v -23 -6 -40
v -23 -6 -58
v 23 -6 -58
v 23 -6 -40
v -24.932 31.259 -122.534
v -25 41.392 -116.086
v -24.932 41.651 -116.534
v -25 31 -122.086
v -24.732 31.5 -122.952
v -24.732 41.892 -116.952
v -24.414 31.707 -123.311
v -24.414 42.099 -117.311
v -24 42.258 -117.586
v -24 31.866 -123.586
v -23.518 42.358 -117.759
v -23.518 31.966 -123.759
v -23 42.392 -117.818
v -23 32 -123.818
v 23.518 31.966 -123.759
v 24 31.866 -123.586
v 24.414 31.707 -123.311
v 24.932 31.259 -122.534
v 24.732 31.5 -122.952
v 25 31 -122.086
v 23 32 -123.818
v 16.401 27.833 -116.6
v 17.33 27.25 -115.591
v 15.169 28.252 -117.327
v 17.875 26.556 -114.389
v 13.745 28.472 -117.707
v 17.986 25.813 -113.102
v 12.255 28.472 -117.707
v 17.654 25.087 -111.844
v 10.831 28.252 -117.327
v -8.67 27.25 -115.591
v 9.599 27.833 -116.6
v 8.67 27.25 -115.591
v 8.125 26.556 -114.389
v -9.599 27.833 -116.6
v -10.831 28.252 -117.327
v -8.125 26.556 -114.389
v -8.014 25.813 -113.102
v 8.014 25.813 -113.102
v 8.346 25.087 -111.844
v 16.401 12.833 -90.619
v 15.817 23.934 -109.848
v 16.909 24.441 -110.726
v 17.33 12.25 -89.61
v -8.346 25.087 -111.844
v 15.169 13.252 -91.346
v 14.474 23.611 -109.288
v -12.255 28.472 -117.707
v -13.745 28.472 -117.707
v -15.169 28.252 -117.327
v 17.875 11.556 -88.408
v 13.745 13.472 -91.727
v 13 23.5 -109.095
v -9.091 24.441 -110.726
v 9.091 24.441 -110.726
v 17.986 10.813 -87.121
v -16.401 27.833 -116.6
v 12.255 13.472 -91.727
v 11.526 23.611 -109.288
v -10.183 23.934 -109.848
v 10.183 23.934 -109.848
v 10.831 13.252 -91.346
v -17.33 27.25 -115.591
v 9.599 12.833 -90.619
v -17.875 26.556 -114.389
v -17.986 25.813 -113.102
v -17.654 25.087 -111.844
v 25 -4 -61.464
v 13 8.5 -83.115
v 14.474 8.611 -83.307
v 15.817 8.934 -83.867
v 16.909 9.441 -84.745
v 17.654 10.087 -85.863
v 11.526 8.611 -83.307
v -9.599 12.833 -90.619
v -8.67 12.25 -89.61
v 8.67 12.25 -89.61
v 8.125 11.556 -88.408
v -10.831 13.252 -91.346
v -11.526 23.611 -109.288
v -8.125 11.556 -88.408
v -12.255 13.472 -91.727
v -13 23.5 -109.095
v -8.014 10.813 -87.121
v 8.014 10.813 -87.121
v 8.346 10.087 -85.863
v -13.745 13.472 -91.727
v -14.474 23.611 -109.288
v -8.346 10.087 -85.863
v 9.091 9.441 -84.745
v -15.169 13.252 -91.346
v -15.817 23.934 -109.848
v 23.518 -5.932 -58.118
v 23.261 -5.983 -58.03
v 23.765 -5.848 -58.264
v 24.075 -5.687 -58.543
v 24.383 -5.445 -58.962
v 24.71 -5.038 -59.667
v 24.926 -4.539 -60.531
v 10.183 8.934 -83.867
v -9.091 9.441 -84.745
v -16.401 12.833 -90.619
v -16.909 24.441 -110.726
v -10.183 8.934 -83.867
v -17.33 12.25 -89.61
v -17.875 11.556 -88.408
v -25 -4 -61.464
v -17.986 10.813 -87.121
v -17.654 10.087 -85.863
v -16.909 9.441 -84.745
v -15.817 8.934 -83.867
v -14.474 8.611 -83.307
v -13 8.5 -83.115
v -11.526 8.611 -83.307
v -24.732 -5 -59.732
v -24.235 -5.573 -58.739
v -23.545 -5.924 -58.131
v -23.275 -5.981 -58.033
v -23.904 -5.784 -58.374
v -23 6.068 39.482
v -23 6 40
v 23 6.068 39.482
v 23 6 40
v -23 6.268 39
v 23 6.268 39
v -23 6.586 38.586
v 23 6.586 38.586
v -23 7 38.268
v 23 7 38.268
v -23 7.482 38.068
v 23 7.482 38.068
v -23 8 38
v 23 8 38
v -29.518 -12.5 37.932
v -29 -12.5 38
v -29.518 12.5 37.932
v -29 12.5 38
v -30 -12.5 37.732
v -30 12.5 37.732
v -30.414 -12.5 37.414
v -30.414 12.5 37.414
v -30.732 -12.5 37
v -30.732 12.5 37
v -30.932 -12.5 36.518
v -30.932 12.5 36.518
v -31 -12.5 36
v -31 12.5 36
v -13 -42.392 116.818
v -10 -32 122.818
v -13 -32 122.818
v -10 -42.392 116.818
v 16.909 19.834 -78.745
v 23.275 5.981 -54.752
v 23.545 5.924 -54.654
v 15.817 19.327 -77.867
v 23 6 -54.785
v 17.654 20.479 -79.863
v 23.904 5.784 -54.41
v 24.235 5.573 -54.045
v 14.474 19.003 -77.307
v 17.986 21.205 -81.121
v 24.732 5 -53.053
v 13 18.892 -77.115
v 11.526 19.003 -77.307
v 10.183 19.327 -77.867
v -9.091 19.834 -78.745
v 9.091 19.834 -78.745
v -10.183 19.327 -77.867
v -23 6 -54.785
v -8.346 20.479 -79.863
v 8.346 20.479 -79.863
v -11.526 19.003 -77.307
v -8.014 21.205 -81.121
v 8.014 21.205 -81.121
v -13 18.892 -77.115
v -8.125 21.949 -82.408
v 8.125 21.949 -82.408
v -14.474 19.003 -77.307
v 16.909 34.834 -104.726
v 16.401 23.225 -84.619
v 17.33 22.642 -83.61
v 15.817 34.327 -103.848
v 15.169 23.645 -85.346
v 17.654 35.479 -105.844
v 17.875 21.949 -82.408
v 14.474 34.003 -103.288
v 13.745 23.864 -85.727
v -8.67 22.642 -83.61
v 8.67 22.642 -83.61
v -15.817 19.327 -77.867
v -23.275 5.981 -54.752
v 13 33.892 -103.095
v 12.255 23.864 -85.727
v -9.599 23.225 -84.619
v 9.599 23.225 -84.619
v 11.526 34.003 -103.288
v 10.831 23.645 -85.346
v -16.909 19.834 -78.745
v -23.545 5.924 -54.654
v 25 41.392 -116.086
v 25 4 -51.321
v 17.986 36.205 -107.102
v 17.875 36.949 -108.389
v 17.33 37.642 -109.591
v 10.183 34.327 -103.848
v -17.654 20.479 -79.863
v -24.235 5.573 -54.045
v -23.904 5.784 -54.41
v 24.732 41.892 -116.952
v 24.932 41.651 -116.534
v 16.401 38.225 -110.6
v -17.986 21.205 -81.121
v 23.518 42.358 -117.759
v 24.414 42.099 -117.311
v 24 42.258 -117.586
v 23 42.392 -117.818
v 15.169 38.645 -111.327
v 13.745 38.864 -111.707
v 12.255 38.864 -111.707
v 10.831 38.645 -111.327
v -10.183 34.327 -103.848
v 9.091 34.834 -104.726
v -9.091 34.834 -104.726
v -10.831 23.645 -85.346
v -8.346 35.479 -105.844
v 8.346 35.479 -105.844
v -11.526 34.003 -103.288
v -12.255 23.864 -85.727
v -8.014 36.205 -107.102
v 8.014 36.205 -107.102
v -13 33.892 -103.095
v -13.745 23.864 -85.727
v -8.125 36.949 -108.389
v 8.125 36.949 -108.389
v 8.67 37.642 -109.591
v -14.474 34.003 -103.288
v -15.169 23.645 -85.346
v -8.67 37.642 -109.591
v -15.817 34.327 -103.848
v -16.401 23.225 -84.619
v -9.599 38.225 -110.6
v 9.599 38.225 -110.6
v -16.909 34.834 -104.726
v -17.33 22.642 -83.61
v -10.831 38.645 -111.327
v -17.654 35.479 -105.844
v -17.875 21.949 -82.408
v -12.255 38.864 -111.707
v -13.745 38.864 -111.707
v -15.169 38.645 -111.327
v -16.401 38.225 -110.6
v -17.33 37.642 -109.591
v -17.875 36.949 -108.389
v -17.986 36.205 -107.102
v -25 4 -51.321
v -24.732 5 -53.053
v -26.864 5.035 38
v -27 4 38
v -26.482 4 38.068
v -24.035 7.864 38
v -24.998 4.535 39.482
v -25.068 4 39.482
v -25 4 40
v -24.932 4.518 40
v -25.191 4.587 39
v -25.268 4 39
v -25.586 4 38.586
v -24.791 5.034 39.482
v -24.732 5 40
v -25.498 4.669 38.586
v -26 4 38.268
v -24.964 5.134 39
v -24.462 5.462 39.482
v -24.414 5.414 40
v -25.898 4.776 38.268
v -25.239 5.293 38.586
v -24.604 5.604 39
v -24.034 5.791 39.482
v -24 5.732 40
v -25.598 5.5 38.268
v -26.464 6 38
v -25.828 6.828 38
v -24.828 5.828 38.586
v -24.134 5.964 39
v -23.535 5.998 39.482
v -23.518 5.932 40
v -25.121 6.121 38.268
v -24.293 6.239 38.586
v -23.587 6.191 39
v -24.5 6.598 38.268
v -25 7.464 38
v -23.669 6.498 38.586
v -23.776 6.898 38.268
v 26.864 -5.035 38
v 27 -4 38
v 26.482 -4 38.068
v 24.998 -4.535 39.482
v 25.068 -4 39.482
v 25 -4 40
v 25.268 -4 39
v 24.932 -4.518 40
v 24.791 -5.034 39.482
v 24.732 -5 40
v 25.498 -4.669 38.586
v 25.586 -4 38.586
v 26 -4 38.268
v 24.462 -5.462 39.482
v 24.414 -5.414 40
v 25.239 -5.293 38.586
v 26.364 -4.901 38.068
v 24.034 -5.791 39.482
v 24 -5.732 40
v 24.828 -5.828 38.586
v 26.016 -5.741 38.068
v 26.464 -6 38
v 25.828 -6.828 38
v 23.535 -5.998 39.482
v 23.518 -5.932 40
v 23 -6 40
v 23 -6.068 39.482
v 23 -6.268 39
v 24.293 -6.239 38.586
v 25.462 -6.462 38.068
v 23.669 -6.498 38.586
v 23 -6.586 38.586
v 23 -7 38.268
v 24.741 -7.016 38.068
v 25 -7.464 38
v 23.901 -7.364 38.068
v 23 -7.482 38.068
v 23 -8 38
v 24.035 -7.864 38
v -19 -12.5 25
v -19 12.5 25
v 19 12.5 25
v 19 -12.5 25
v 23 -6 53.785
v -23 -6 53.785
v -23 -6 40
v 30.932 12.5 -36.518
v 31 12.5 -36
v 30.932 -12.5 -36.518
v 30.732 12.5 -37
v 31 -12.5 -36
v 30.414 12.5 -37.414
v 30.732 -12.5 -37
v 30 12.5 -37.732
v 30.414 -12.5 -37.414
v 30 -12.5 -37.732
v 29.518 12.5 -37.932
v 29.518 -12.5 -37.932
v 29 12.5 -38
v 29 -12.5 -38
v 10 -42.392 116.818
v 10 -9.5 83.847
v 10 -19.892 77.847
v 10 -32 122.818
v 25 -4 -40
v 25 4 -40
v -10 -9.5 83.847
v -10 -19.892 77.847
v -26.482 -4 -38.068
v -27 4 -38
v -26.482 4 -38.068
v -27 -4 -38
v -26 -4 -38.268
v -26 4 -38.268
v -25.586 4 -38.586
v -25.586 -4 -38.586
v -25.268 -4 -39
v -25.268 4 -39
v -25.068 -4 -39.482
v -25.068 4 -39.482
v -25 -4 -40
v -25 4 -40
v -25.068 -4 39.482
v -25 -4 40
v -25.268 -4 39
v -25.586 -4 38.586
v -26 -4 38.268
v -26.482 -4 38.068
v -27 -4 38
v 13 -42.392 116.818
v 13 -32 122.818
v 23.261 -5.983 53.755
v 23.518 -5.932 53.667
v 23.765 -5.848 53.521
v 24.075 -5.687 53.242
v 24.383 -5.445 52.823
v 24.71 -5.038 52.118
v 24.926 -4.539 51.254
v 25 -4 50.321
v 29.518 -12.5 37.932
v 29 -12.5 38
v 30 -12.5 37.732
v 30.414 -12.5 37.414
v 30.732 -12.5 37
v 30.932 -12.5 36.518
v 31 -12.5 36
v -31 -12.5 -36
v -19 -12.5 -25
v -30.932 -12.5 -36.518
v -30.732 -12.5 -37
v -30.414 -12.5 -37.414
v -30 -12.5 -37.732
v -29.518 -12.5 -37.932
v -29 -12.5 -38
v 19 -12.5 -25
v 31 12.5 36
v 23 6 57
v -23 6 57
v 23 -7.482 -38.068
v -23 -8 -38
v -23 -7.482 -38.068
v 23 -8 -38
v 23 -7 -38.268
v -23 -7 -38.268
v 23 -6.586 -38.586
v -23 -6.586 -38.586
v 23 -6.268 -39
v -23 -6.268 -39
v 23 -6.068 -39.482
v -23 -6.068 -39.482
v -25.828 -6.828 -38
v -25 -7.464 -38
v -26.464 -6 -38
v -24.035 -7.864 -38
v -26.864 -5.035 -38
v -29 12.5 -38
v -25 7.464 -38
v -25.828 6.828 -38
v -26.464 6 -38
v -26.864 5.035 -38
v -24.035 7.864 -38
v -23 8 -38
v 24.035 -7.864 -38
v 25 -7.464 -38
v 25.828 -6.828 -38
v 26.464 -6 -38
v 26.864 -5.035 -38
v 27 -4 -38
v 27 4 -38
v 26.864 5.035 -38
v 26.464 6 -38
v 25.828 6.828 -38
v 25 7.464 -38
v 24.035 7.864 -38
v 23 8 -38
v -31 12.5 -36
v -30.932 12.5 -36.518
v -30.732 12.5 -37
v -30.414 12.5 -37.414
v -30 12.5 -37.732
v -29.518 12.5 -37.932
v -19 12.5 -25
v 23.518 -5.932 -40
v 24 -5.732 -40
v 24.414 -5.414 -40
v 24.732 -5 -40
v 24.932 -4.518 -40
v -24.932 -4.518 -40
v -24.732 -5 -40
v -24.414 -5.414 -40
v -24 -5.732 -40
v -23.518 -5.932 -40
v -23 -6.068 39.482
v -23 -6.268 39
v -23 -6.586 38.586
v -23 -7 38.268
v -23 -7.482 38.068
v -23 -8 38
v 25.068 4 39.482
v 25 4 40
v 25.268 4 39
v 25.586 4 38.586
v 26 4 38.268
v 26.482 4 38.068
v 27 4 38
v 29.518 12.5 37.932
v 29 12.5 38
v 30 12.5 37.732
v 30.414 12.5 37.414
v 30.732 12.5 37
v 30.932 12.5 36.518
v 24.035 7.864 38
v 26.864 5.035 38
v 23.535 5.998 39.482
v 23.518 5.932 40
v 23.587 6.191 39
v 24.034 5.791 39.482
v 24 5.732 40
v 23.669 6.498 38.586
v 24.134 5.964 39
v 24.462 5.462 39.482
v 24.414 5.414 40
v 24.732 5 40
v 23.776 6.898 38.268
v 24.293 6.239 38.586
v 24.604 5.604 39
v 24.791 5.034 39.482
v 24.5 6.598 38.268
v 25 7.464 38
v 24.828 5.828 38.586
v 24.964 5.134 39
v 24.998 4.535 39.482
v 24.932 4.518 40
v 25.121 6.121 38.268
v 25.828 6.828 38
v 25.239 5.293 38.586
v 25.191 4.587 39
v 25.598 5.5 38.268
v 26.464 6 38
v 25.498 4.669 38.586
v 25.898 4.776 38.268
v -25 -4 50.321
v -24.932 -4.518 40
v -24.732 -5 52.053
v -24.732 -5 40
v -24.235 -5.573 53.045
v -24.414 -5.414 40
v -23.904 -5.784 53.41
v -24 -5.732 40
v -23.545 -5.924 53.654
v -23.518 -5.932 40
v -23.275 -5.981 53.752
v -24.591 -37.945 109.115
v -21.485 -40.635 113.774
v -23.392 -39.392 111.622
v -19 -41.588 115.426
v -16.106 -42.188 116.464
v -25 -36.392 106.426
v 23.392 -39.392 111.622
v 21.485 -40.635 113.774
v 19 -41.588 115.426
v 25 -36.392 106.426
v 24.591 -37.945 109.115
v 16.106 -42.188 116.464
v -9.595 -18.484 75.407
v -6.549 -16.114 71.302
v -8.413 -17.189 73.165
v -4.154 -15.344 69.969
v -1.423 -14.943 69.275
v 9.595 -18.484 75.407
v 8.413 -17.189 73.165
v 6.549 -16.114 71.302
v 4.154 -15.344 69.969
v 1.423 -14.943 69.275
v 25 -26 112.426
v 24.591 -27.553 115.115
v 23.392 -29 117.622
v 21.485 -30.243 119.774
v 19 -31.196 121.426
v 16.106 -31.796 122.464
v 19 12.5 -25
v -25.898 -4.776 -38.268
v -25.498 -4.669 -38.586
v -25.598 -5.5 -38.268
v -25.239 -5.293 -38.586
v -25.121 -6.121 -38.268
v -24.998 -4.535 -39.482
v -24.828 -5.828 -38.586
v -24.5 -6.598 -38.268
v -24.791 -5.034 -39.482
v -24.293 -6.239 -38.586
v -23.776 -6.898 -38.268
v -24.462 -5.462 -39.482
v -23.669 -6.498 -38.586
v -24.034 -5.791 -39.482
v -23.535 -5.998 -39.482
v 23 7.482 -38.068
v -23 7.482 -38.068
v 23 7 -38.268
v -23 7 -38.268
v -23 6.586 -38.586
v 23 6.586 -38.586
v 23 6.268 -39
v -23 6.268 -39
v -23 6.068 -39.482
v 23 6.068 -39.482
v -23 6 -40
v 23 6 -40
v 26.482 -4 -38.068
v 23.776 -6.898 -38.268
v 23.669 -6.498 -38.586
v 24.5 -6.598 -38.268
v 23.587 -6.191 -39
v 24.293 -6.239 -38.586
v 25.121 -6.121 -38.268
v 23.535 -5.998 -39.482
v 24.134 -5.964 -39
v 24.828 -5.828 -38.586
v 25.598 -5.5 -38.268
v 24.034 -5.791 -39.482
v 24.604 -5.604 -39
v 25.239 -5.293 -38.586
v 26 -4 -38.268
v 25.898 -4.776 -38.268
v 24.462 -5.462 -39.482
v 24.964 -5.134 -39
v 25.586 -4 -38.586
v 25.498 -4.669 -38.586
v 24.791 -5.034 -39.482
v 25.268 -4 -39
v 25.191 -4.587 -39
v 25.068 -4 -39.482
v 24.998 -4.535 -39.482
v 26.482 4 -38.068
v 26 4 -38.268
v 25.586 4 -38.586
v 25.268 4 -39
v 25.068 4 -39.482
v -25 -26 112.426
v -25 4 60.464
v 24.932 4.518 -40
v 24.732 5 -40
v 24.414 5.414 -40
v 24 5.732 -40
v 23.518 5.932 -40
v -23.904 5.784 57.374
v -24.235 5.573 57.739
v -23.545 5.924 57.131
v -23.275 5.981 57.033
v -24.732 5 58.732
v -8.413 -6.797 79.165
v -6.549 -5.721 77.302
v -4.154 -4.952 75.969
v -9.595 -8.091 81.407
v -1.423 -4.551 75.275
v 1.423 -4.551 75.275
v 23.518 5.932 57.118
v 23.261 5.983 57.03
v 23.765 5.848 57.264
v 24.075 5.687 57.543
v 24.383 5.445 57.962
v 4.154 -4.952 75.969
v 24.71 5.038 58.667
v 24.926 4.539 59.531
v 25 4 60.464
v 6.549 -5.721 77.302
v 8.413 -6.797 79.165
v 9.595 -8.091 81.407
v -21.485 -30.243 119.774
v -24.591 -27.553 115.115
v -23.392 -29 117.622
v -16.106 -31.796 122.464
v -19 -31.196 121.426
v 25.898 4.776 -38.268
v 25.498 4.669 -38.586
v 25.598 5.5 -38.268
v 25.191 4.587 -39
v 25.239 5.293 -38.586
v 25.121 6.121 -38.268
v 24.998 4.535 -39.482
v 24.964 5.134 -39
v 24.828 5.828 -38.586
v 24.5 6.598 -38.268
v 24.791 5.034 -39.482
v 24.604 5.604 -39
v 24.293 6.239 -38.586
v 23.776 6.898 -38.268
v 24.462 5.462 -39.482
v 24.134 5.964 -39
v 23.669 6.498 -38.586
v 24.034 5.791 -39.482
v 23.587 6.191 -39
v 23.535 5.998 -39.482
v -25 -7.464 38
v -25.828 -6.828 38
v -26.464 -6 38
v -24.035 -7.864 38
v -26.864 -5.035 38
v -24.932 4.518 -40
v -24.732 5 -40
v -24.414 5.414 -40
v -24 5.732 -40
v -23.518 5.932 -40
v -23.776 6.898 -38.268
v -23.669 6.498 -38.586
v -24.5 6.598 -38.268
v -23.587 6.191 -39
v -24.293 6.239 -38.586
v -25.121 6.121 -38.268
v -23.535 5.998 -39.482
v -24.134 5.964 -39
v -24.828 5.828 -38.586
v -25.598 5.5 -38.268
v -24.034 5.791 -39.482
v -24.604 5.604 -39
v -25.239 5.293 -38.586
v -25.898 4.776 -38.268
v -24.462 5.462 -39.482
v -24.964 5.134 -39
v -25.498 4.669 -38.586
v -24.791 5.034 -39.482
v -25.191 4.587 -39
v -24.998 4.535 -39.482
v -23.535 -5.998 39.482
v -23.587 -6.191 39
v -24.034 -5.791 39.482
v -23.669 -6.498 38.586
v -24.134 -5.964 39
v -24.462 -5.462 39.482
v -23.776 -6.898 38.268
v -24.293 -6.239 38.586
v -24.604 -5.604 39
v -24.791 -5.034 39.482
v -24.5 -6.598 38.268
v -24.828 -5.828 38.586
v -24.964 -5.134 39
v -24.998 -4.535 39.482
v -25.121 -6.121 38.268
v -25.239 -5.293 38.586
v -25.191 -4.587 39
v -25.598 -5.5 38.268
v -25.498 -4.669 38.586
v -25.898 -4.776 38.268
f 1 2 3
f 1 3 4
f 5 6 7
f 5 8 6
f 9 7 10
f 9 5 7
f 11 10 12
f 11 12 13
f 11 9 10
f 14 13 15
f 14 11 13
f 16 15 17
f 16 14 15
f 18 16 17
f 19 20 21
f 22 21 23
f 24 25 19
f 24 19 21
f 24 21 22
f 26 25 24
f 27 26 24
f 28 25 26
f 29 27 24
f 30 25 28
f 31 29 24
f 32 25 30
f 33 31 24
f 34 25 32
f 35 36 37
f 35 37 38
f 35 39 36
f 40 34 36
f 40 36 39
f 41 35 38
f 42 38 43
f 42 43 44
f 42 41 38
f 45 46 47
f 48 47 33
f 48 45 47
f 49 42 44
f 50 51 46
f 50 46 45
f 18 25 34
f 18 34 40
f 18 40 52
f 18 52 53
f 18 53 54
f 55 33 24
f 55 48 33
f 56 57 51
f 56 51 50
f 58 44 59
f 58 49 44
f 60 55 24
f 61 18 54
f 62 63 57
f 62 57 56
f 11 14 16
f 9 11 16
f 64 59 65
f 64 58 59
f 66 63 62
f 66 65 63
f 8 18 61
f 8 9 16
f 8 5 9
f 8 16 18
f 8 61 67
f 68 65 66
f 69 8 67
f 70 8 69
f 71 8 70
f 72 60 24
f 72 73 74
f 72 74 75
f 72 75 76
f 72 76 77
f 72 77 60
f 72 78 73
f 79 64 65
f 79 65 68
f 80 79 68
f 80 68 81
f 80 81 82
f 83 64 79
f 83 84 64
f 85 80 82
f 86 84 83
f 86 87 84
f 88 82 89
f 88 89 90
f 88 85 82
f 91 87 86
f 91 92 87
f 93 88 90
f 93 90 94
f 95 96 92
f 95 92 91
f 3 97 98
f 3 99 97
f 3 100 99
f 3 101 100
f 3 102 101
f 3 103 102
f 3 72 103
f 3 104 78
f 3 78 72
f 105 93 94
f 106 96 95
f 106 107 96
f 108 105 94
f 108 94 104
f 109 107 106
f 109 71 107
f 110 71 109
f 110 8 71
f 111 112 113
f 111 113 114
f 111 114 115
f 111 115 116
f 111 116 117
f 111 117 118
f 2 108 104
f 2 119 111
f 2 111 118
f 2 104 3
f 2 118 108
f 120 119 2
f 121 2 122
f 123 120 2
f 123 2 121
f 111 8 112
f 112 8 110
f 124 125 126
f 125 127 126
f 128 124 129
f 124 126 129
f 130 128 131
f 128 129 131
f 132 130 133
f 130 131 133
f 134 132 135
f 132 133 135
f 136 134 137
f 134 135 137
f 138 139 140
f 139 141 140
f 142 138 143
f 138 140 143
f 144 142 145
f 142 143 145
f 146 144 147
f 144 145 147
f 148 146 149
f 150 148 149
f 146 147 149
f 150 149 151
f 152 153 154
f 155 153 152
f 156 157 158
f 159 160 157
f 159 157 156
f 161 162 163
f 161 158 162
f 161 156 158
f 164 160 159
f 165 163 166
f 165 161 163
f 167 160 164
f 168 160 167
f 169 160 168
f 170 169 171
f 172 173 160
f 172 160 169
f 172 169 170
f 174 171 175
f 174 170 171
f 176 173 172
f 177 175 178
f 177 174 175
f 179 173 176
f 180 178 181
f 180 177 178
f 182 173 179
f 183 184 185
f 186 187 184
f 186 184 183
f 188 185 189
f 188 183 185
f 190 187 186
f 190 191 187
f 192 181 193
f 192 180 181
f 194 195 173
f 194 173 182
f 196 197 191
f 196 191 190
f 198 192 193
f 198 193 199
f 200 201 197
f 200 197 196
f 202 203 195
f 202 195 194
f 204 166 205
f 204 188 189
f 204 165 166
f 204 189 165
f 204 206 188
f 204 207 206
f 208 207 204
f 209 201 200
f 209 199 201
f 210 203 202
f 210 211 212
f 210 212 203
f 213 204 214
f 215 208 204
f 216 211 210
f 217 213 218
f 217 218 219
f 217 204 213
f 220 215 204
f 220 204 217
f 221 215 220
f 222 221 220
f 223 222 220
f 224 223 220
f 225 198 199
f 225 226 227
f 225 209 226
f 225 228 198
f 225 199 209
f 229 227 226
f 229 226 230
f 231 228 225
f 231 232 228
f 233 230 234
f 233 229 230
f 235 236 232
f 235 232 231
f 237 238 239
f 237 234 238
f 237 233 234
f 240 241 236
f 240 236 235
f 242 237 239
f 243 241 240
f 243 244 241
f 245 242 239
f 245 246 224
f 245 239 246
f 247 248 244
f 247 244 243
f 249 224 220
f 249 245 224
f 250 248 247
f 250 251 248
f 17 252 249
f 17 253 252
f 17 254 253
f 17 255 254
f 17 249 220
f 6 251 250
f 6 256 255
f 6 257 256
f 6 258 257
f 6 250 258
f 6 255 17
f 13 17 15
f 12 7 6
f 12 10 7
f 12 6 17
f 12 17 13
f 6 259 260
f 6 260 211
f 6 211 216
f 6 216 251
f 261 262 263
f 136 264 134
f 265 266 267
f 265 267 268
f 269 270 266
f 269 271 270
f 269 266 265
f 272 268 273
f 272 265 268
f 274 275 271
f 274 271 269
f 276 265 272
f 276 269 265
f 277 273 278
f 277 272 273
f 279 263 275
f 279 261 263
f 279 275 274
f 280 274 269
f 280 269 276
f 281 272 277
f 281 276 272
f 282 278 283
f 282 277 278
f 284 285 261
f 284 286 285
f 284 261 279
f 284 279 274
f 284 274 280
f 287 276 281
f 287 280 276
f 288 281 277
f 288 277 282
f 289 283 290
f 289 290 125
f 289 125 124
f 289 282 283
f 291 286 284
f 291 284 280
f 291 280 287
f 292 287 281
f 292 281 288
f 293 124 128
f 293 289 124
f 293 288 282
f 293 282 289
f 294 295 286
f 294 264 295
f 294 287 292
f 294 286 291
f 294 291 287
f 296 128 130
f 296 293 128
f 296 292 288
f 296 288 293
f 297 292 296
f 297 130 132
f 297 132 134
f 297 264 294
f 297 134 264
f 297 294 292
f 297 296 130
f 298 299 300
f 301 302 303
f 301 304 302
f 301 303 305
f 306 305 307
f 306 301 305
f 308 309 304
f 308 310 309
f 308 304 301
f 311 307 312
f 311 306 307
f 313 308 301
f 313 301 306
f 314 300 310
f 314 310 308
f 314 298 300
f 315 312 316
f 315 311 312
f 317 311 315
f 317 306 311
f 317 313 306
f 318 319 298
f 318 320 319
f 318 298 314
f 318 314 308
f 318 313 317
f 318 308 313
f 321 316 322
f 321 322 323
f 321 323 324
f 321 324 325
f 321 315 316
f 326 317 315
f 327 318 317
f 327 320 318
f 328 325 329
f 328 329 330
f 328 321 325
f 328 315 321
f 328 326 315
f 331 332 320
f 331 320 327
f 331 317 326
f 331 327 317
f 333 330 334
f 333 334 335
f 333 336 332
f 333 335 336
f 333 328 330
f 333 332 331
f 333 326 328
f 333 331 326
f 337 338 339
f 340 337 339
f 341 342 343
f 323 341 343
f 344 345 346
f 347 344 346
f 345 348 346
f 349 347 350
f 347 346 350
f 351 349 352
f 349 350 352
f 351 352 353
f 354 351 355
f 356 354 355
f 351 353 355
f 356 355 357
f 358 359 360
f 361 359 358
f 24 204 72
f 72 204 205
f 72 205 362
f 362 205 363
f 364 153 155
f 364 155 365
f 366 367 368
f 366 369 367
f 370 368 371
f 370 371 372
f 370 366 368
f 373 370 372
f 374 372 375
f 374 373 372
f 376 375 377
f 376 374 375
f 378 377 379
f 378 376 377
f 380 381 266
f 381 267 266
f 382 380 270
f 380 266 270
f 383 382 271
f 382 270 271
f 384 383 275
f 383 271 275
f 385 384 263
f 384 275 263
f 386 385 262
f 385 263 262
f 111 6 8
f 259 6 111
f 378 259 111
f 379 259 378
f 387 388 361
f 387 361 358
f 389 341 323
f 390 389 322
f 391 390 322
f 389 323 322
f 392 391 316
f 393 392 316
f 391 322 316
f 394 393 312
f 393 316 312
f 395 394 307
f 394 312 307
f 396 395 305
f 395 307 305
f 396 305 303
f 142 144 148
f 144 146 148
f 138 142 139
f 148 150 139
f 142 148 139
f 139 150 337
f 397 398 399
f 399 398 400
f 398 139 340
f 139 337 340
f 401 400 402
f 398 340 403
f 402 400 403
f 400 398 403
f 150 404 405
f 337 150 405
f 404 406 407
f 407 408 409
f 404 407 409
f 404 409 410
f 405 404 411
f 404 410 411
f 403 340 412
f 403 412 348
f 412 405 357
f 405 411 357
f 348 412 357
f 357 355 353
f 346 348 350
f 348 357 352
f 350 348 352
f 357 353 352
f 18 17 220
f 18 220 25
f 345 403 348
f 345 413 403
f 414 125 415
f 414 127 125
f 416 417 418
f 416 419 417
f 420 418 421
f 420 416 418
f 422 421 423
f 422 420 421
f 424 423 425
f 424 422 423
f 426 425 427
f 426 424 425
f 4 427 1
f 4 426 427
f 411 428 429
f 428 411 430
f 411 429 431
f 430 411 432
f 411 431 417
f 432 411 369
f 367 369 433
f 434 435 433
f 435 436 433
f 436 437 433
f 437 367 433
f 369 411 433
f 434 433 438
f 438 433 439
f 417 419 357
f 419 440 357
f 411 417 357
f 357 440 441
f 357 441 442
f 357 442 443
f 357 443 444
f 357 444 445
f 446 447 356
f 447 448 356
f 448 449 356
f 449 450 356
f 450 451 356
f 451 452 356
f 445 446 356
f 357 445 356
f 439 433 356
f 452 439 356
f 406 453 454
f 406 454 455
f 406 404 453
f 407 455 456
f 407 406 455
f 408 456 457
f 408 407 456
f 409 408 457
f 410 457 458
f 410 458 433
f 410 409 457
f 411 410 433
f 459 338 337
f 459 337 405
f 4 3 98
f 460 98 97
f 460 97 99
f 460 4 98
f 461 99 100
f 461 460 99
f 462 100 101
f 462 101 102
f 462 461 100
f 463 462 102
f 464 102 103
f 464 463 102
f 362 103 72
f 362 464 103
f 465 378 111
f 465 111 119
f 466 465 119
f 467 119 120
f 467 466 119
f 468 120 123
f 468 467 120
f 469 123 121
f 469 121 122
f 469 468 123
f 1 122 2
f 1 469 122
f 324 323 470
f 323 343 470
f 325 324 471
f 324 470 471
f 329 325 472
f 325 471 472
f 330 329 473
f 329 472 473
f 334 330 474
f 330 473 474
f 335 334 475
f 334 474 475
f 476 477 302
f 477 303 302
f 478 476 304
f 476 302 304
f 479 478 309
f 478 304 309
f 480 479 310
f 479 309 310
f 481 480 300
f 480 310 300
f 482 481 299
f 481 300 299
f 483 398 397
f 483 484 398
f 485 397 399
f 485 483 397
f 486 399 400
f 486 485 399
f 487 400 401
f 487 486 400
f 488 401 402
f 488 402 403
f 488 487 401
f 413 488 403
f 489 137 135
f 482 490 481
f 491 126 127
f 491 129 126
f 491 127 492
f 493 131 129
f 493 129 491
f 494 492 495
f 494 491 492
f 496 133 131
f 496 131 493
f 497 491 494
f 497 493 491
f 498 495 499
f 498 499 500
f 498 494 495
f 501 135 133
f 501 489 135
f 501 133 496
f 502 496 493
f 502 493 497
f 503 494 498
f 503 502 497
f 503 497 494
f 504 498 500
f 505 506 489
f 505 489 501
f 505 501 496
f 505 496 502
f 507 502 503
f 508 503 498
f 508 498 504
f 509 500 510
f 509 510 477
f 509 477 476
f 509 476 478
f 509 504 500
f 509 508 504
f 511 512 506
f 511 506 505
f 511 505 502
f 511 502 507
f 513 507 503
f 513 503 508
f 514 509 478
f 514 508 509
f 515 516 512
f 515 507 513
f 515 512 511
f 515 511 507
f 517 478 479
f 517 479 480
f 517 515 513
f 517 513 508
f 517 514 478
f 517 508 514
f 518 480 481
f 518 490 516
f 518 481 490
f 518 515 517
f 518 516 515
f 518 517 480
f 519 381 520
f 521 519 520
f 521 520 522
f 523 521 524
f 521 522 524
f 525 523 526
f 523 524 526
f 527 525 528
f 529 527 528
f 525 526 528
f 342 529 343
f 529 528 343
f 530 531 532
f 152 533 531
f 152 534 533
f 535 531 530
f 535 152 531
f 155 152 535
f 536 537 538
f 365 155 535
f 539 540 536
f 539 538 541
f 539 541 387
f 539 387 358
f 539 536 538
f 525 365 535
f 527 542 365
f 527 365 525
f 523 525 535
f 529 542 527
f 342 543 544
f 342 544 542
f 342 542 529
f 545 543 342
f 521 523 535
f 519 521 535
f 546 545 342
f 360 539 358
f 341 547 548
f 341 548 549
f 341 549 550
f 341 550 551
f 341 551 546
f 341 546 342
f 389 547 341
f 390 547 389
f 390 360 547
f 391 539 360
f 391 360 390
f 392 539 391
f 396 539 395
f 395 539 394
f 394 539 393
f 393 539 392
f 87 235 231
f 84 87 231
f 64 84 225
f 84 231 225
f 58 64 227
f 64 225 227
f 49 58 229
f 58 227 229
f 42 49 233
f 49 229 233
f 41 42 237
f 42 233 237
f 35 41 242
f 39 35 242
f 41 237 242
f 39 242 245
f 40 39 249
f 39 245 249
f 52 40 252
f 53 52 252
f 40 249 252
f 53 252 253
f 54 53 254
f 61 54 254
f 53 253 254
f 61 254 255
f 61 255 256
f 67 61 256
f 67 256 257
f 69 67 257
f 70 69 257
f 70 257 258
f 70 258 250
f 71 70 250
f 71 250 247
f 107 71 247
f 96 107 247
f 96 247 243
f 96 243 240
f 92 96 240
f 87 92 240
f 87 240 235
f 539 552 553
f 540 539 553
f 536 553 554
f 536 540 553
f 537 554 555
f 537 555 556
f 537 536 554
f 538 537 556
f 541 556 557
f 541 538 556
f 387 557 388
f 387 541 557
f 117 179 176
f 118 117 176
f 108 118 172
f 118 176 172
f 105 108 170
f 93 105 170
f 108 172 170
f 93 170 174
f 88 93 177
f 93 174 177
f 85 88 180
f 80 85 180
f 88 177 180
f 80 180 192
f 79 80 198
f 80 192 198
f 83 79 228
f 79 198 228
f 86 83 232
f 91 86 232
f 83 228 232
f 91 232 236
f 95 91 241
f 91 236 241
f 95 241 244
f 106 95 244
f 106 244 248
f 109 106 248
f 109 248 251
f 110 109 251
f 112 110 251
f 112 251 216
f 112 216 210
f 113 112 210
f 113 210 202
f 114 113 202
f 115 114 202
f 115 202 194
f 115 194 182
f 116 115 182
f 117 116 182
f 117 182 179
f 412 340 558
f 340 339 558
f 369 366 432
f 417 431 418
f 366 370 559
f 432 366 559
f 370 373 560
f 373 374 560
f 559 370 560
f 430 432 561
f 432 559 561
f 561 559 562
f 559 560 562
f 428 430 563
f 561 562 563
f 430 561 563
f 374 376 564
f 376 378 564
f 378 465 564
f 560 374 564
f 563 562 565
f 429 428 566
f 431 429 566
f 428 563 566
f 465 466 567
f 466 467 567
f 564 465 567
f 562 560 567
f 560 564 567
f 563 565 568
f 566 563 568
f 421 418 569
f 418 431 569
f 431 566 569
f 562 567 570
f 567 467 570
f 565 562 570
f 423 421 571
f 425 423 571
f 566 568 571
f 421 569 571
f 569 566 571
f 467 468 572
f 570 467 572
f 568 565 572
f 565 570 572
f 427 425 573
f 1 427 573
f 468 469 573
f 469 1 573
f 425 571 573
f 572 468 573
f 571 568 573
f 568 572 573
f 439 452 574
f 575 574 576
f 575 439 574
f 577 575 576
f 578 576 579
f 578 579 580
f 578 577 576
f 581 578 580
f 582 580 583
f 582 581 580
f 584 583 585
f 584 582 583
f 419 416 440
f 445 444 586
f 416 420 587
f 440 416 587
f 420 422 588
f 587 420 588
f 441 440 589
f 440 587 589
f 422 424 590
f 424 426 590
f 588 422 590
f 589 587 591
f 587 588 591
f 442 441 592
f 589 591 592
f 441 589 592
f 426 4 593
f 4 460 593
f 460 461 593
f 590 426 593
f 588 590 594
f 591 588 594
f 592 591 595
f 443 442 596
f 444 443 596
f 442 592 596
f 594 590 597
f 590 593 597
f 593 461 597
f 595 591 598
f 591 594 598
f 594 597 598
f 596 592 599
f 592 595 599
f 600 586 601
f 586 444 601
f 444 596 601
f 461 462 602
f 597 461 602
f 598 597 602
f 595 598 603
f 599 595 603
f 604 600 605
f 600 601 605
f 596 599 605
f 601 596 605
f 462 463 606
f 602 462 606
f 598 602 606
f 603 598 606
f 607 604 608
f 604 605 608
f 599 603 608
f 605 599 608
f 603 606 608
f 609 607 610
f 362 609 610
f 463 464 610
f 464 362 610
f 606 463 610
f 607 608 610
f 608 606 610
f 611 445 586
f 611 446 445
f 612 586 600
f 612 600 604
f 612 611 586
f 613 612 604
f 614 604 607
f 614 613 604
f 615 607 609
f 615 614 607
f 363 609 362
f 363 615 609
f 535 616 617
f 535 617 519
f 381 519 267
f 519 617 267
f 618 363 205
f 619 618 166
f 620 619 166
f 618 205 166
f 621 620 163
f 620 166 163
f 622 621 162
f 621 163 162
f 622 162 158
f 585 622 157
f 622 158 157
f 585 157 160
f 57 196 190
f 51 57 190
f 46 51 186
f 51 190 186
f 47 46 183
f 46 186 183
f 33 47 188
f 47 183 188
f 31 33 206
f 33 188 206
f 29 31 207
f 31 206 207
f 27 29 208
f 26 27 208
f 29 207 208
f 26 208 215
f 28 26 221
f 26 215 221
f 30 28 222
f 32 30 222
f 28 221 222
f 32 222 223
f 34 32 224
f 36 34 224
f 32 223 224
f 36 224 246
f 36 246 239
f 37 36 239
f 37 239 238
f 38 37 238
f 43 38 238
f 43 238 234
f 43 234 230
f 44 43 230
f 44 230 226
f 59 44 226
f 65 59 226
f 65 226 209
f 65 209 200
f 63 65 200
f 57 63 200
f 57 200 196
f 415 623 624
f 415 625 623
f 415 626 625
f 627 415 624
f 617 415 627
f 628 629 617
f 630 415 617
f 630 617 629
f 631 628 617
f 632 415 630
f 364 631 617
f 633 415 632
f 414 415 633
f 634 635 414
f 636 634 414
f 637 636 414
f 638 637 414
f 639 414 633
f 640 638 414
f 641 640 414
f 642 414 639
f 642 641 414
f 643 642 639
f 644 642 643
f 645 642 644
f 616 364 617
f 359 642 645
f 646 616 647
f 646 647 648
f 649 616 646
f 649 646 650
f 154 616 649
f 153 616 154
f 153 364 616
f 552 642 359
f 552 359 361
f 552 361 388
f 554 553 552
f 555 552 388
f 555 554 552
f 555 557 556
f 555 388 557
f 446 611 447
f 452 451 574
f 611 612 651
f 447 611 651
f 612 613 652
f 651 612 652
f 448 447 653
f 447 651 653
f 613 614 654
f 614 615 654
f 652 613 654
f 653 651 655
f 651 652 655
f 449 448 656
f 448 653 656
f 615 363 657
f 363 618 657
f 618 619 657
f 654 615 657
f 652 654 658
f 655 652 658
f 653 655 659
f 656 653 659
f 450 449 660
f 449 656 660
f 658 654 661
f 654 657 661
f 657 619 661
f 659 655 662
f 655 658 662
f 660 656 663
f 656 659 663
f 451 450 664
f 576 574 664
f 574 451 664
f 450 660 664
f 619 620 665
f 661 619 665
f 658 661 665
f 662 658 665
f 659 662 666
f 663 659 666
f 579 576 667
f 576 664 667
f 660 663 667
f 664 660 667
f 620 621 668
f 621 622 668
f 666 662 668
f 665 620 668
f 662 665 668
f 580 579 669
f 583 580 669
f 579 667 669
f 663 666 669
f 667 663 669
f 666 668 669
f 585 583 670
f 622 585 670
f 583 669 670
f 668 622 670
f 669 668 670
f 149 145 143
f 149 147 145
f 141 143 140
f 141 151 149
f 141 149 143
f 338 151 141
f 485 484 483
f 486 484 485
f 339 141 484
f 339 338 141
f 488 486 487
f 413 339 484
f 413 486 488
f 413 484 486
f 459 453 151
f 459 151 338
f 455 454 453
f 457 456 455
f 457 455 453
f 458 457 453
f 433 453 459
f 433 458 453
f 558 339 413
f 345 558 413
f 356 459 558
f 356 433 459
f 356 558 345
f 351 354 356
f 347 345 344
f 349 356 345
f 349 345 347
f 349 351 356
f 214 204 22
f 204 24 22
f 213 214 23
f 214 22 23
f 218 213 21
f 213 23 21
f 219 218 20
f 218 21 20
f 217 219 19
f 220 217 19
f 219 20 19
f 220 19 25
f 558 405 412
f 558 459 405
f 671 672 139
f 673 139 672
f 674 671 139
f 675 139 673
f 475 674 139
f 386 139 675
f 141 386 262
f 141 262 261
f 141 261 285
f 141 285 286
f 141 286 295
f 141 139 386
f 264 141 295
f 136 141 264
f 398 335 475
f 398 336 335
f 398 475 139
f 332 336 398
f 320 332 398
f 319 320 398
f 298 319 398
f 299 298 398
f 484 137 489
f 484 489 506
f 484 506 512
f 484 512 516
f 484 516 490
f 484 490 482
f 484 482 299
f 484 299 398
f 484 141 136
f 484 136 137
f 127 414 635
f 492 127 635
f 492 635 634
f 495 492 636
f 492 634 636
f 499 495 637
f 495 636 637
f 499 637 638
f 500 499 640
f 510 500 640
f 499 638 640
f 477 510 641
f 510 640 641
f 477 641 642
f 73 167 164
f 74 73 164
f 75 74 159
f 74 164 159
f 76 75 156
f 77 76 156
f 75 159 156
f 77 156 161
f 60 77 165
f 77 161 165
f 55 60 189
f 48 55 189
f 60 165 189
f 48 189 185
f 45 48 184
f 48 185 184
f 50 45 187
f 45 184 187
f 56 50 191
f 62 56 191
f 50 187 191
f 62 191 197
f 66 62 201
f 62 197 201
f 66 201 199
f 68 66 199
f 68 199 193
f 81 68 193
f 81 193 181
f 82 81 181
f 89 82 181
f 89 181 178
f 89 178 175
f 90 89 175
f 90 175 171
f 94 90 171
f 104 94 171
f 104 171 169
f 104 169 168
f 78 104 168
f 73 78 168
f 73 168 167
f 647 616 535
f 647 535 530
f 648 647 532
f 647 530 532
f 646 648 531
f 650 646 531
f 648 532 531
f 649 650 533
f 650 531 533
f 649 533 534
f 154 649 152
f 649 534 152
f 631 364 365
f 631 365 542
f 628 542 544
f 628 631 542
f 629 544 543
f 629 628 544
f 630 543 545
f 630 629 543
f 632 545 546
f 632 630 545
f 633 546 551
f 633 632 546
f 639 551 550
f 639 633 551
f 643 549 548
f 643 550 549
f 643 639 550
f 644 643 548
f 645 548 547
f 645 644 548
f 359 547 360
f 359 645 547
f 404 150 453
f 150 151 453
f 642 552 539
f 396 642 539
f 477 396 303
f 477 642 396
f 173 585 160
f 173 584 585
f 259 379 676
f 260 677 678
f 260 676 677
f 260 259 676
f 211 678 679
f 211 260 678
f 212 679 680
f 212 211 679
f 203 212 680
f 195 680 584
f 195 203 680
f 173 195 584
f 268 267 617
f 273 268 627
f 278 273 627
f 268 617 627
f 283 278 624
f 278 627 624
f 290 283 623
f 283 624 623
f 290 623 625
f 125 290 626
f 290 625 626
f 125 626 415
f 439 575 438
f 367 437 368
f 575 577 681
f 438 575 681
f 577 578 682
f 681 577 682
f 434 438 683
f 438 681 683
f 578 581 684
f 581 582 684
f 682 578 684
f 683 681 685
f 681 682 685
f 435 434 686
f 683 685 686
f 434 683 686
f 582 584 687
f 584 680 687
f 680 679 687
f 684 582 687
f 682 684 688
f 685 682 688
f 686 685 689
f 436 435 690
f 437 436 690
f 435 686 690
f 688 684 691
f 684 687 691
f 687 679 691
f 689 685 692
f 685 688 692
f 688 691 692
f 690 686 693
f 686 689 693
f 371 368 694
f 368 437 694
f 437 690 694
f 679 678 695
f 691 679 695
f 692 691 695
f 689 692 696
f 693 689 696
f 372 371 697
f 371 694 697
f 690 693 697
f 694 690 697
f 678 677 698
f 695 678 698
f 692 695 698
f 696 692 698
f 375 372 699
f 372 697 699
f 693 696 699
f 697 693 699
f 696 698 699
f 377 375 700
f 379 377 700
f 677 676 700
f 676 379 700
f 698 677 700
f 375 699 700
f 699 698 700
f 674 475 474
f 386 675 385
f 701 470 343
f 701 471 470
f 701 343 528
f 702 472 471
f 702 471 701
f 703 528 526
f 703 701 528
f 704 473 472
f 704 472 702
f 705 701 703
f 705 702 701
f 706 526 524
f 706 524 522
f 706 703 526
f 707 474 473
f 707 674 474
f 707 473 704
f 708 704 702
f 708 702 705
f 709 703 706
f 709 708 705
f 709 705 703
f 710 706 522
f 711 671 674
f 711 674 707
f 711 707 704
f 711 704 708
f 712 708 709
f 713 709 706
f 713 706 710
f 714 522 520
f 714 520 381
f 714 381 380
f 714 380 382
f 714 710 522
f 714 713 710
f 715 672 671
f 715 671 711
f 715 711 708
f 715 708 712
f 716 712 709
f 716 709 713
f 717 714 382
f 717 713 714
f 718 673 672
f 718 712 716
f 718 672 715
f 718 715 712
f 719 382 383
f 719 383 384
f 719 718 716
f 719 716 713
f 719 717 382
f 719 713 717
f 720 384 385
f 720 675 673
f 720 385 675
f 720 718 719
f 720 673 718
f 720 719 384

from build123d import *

# Parameters (mm, degrees)
SKETCH_1_W          = 62
SKETCH_1_H          = 76
SKETCH_1_W_2        = 38
SKETCH_1_H_2        = 50
EXTRUDE_1_DEPTH     = 12.5
EXTRUDE_2_DEPTH     = 25
SKETCH_3_R          = 5
CUT_EXTRUDE_3_DEPTH = 151.634898624
CUT_EXTRUDE_4_DEPTH = 161.843921561
FILLET_1_R          = 12
FILLET_2_R          = 2
FILLET_3_R          = 2


with BuildPart() as part:
    # 草圖1 → 伸長1 (new, symmetric)
    with BuildSketch(Plane(origin=(0, 0, 0), x_dir=(1, 0, 0), z_dir=(0, 1, 0))):
        Rectangle(SKETCH_1_W, SKETCH_1_H)
        Rectangle(SKETCH_1_W_2, SKETCH_1_H_2, mode=Mode.SUBTRACT)
    extrude(amount=EXTRUDE_1_DEPTH, both=True)

    # 草圖2 → 伸長2 (add, symmetric)
    with BuildSketch(Plane(origin=(0, 0, 0), x_dir=(0, 0, -1), z_dir=(1, 0, 0))):
        Polygon((38, 6), (54.784609691, 6), (117.817930688, 42.392304845), (123.817930688, 32), (58, -6), (38, -6), align=None)
        Polygon((-38, 6), (-57, 6), (-122.817930688, -32), (-116.817930688, -42.392304845), (-53.784609691, -6), (-38, -6), align=None)
    extrude(amount=EXTRUDE_2_DEPTH, both=True)

    # 草圖3 → 伸長3 (cut, through all)
    with BuildSketch(Plane(origin=(0, -19.222431864, -11.098076211), x_dir=(1, 0, 0), z_dir=(0, 0.8660254037844377, 0.5000000000000018))):
        with Locations(Location((-13, 111.229473419, 0), (0, 0, 270))):
            Circle(SKETCH_3_R)
        with Locations(Location((13, 111.229473419, 0), (0, 0, 270))):
            Circle(SKETCH_3_R)
        with Locations(Location((-13, 81.229473419, 0), (0, 0, 270))):
            Circle(SKETCH_3_R)
        with Locations(Location((13, 81.229473419, 0), (0, 0, 270))):
            Circle(SKETCH_3_R)
    extrude(amount=-CUT_EXTRUDE_3_DEPTH, mode=Mode.SUBTRACT)

    # 草圖4 → 伸長4 (cut, through all)
    with BuildSketch(Plane(origin=(0, 29.181724008, 16.848076211), x_dir=(1, 0, 0), z_dir=(0, 0.8660254037844377, 0.5000000000000014))):
        with BuildLine():
            Line((-10, -122.363448016), (-10, -77.363448016))
            ThreePointArc((-10, -77.363448016), (0, -67.363448016), (10, -77.363448016))
            Line((10, -77.363448016), (10, -122.363448016))
            Line((10, -122.363448016), (-10, -122.363448016))
        make_face()
    extrude(amount=-CUT_EXTRUDE_4_DEPTH, mode=Mode.SUBTRACT)

    # 圓角1
    fillet_1_edges = [part.edges().sort_by_distance(p)[0] for p in [
        (-25, -37.196152423, 119.817930688),
        (25, -37.196152423, 119.817930688),
    ]]
    fillet(fillet_1_edges, radius=FILLET_1_R)

    # 圓角2
    fillet_2_edges = [part.edges().sort_by_distance(p)[0] for p in [
        (-25, -6, -48),
        (-25, 37.196152423, -120.817930688),
        (-25, 6, -46.392304845),
        (25, -6, -48),
        (25, 37.196152423, -120.817930688),
        (25, 6, -46.392304845),
        (-25, 6, 47.5),
        (-25, -6, 45.892304845),
        (25, 6, 47.5),
        (25, -6, 45.892304845),
        (-31, 0, -38),
        (31, 0, -38),
        (31, 0, 38),
        (-31, 0, 38),
    ]]
    fillet(fillet_2_edges, radius=FILLET_2_R)

    # 圓角3
    fillet_3_edges = [part.edges().sort_by_distance(p)[0] for p in [
        (0, -6, -38),
        (-25, 0, -38),
        (0, 6, -38),
        (25, 0, -38),
        (0, -6, 38),
        (-25, 0, 38),
        (0, 6, 38),
        (25, 0, 38),
        (-24.414213562, -5.414213562, -38),
        (-24.414213562, 5.414213562, -38),
        (24.414213562, -5.414213562, -38),
        (24.414213562, 5.414213562, -38),
        (-24.414213562, -5.414213562, 38),
        (-24.414213562, 5.414213562, 38),
        (24.414213562, -5.414213562, 38),
        (24.414213562, 5.414213562, 38),
    ]]
    fillet(fillet_3_edges, radius=FILLET_3_R)


solid = part.part
